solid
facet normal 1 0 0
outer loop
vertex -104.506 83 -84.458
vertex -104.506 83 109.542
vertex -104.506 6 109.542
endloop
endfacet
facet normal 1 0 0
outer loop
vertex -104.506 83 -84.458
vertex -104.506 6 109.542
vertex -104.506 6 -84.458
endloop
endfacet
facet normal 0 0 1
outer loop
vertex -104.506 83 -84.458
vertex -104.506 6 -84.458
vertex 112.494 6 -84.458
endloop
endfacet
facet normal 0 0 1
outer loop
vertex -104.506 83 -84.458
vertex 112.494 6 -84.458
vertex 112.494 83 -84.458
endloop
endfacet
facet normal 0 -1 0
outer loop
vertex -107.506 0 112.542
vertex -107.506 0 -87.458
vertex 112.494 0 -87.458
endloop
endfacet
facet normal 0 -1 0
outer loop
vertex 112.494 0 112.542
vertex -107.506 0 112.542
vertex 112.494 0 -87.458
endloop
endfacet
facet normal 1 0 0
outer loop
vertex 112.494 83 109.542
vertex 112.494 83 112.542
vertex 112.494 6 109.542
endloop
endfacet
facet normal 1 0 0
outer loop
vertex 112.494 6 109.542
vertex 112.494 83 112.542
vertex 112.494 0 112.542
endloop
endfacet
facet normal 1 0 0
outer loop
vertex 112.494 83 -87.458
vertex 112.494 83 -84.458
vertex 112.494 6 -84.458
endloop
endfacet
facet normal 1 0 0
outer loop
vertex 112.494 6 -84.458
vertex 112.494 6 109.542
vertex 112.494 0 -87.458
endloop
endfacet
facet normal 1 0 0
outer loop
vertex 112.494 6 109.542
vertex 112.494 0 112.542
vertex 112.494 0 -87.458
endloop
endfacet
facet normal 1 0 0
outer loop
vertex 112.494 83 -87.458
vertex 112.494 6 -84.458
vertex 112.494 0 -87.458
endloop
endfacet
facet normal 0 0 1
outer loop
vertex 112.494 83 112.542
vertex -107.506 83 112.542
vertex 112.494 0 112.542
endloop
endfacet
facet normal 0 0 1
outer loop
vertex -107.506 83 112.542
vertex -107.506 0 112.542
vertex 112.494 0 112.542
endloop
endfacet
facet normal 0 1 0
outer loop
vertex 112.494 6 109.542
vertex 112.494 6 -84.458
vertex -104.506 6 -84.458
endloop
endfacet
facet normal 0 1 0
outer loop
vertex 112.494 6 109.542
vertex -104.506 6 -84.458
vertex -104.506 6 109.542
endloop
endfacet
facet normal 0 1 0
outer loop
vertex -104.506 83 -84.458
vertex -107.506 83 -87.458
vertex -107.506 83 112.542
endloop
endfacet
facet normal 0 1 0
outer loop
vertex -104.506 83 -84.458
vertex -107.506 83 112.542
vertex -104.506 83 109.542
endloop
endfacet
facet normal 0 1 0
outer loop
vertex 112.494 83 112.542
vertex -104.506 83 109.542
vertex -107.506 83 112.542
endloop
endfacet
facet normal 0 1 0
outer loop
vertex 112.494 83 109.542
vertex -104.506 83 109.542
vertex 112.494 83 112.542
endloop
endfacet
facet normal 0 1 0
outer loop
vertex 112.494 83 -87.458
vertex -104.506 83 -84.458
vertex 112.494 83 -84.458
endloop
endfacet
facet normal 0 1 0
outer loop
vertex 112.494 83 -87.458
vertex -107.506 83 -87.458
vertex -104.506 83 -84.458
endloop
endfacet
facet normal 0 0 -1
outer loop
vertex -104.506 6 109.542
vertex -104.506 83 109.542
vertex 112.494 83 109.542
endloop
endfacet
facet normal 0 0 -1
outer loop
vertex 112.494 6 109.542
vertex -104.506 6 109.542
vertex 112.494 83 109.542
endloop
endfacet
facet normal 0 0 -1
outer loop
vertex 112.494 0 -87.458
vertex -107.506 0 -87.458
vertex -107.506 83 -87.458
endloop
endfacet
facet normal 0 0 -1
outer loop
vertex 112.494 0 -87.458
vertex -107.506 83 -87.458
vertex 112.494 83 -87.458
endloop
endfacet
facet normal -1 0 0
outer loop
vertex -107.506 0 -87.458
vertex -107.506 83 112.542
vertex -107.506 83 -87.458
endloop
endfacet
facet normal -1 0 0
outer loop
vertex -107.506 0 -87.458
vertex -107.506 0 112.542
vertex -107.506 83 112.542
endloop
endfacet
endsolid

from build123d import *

# Parameters (mm, degrees)
SKETCH1_W           = 220
SKETCH1_H           = 200
BOSS_EXTRUDE1_DEPTH = 3
SKETCH3_W           = 220
SKETCH3_H           = 200
BOSS_EXTRUDE3_DEPTH = 80
SKETCH9_W           = 214
SKETCH9_H           = 194
CUT_EXTRUDE1_DEPTH  = 77
SKETCH13_W          = 194
SKETCH13_H          = 77
CUT_EXTRUDE4_DEPTH  = 197


with BuildPart() as part:
    # Sketch1 → Boss-Extrude1 (new body)
    with BuildSketch(Plane(origin=(0, 0, 0), x_dir=(1, 0, 0), z_dir=(0, 1, 0))):
        with Locations((2.493847253, -12.542456993)):
            Rectangle(SKETCH1_W, SKETCH1_H)
    extrude(amount=BOSS_EXTRUDE1_DEPTH)

    # Sketch3 → Boss-Extrude3 (add)
    with BuildSketch(Plane(origin=(0, 3, 0), x_dir=(1, 0, 0), z_dir=(0, 1, 0))):
        with Locations((2.493847253, -12.542456993)):
            Rectangle(SKETCH3_W, SKETCH3_H)
    extrude(amount=BOSS_EXTRUDE3_DEPTH)

    # Sketch9 → Cut-Extrude1 (cut)
    with BuildSketch(Plane(origin=(0, 83, 0), x_dir=(1, 0, 0), z_dir=(0, 1, 0))):
        with Locations((2.493847253, -12.542456993)):
            Rectangle(SKETCH9_W, SKETCH9_H)
    extrude(amount=-CUT_EXTRUDE1_DEPTH, mode=Mode.SUBTRACT)

    # Sketch13 → Cut-Extrude4 (cut)
    with BuildSketch(Plane.ZY.offset(-109.493847253)):
        with Locations((12.542456993, 44.5)):
            Rectangle(SKETCH13_W, SKETCH13_H)
    extrude(amount=-CUT_EXTRUDE4_DEPTH, mode=Mode.SUBTRACT)


solid = part.part
